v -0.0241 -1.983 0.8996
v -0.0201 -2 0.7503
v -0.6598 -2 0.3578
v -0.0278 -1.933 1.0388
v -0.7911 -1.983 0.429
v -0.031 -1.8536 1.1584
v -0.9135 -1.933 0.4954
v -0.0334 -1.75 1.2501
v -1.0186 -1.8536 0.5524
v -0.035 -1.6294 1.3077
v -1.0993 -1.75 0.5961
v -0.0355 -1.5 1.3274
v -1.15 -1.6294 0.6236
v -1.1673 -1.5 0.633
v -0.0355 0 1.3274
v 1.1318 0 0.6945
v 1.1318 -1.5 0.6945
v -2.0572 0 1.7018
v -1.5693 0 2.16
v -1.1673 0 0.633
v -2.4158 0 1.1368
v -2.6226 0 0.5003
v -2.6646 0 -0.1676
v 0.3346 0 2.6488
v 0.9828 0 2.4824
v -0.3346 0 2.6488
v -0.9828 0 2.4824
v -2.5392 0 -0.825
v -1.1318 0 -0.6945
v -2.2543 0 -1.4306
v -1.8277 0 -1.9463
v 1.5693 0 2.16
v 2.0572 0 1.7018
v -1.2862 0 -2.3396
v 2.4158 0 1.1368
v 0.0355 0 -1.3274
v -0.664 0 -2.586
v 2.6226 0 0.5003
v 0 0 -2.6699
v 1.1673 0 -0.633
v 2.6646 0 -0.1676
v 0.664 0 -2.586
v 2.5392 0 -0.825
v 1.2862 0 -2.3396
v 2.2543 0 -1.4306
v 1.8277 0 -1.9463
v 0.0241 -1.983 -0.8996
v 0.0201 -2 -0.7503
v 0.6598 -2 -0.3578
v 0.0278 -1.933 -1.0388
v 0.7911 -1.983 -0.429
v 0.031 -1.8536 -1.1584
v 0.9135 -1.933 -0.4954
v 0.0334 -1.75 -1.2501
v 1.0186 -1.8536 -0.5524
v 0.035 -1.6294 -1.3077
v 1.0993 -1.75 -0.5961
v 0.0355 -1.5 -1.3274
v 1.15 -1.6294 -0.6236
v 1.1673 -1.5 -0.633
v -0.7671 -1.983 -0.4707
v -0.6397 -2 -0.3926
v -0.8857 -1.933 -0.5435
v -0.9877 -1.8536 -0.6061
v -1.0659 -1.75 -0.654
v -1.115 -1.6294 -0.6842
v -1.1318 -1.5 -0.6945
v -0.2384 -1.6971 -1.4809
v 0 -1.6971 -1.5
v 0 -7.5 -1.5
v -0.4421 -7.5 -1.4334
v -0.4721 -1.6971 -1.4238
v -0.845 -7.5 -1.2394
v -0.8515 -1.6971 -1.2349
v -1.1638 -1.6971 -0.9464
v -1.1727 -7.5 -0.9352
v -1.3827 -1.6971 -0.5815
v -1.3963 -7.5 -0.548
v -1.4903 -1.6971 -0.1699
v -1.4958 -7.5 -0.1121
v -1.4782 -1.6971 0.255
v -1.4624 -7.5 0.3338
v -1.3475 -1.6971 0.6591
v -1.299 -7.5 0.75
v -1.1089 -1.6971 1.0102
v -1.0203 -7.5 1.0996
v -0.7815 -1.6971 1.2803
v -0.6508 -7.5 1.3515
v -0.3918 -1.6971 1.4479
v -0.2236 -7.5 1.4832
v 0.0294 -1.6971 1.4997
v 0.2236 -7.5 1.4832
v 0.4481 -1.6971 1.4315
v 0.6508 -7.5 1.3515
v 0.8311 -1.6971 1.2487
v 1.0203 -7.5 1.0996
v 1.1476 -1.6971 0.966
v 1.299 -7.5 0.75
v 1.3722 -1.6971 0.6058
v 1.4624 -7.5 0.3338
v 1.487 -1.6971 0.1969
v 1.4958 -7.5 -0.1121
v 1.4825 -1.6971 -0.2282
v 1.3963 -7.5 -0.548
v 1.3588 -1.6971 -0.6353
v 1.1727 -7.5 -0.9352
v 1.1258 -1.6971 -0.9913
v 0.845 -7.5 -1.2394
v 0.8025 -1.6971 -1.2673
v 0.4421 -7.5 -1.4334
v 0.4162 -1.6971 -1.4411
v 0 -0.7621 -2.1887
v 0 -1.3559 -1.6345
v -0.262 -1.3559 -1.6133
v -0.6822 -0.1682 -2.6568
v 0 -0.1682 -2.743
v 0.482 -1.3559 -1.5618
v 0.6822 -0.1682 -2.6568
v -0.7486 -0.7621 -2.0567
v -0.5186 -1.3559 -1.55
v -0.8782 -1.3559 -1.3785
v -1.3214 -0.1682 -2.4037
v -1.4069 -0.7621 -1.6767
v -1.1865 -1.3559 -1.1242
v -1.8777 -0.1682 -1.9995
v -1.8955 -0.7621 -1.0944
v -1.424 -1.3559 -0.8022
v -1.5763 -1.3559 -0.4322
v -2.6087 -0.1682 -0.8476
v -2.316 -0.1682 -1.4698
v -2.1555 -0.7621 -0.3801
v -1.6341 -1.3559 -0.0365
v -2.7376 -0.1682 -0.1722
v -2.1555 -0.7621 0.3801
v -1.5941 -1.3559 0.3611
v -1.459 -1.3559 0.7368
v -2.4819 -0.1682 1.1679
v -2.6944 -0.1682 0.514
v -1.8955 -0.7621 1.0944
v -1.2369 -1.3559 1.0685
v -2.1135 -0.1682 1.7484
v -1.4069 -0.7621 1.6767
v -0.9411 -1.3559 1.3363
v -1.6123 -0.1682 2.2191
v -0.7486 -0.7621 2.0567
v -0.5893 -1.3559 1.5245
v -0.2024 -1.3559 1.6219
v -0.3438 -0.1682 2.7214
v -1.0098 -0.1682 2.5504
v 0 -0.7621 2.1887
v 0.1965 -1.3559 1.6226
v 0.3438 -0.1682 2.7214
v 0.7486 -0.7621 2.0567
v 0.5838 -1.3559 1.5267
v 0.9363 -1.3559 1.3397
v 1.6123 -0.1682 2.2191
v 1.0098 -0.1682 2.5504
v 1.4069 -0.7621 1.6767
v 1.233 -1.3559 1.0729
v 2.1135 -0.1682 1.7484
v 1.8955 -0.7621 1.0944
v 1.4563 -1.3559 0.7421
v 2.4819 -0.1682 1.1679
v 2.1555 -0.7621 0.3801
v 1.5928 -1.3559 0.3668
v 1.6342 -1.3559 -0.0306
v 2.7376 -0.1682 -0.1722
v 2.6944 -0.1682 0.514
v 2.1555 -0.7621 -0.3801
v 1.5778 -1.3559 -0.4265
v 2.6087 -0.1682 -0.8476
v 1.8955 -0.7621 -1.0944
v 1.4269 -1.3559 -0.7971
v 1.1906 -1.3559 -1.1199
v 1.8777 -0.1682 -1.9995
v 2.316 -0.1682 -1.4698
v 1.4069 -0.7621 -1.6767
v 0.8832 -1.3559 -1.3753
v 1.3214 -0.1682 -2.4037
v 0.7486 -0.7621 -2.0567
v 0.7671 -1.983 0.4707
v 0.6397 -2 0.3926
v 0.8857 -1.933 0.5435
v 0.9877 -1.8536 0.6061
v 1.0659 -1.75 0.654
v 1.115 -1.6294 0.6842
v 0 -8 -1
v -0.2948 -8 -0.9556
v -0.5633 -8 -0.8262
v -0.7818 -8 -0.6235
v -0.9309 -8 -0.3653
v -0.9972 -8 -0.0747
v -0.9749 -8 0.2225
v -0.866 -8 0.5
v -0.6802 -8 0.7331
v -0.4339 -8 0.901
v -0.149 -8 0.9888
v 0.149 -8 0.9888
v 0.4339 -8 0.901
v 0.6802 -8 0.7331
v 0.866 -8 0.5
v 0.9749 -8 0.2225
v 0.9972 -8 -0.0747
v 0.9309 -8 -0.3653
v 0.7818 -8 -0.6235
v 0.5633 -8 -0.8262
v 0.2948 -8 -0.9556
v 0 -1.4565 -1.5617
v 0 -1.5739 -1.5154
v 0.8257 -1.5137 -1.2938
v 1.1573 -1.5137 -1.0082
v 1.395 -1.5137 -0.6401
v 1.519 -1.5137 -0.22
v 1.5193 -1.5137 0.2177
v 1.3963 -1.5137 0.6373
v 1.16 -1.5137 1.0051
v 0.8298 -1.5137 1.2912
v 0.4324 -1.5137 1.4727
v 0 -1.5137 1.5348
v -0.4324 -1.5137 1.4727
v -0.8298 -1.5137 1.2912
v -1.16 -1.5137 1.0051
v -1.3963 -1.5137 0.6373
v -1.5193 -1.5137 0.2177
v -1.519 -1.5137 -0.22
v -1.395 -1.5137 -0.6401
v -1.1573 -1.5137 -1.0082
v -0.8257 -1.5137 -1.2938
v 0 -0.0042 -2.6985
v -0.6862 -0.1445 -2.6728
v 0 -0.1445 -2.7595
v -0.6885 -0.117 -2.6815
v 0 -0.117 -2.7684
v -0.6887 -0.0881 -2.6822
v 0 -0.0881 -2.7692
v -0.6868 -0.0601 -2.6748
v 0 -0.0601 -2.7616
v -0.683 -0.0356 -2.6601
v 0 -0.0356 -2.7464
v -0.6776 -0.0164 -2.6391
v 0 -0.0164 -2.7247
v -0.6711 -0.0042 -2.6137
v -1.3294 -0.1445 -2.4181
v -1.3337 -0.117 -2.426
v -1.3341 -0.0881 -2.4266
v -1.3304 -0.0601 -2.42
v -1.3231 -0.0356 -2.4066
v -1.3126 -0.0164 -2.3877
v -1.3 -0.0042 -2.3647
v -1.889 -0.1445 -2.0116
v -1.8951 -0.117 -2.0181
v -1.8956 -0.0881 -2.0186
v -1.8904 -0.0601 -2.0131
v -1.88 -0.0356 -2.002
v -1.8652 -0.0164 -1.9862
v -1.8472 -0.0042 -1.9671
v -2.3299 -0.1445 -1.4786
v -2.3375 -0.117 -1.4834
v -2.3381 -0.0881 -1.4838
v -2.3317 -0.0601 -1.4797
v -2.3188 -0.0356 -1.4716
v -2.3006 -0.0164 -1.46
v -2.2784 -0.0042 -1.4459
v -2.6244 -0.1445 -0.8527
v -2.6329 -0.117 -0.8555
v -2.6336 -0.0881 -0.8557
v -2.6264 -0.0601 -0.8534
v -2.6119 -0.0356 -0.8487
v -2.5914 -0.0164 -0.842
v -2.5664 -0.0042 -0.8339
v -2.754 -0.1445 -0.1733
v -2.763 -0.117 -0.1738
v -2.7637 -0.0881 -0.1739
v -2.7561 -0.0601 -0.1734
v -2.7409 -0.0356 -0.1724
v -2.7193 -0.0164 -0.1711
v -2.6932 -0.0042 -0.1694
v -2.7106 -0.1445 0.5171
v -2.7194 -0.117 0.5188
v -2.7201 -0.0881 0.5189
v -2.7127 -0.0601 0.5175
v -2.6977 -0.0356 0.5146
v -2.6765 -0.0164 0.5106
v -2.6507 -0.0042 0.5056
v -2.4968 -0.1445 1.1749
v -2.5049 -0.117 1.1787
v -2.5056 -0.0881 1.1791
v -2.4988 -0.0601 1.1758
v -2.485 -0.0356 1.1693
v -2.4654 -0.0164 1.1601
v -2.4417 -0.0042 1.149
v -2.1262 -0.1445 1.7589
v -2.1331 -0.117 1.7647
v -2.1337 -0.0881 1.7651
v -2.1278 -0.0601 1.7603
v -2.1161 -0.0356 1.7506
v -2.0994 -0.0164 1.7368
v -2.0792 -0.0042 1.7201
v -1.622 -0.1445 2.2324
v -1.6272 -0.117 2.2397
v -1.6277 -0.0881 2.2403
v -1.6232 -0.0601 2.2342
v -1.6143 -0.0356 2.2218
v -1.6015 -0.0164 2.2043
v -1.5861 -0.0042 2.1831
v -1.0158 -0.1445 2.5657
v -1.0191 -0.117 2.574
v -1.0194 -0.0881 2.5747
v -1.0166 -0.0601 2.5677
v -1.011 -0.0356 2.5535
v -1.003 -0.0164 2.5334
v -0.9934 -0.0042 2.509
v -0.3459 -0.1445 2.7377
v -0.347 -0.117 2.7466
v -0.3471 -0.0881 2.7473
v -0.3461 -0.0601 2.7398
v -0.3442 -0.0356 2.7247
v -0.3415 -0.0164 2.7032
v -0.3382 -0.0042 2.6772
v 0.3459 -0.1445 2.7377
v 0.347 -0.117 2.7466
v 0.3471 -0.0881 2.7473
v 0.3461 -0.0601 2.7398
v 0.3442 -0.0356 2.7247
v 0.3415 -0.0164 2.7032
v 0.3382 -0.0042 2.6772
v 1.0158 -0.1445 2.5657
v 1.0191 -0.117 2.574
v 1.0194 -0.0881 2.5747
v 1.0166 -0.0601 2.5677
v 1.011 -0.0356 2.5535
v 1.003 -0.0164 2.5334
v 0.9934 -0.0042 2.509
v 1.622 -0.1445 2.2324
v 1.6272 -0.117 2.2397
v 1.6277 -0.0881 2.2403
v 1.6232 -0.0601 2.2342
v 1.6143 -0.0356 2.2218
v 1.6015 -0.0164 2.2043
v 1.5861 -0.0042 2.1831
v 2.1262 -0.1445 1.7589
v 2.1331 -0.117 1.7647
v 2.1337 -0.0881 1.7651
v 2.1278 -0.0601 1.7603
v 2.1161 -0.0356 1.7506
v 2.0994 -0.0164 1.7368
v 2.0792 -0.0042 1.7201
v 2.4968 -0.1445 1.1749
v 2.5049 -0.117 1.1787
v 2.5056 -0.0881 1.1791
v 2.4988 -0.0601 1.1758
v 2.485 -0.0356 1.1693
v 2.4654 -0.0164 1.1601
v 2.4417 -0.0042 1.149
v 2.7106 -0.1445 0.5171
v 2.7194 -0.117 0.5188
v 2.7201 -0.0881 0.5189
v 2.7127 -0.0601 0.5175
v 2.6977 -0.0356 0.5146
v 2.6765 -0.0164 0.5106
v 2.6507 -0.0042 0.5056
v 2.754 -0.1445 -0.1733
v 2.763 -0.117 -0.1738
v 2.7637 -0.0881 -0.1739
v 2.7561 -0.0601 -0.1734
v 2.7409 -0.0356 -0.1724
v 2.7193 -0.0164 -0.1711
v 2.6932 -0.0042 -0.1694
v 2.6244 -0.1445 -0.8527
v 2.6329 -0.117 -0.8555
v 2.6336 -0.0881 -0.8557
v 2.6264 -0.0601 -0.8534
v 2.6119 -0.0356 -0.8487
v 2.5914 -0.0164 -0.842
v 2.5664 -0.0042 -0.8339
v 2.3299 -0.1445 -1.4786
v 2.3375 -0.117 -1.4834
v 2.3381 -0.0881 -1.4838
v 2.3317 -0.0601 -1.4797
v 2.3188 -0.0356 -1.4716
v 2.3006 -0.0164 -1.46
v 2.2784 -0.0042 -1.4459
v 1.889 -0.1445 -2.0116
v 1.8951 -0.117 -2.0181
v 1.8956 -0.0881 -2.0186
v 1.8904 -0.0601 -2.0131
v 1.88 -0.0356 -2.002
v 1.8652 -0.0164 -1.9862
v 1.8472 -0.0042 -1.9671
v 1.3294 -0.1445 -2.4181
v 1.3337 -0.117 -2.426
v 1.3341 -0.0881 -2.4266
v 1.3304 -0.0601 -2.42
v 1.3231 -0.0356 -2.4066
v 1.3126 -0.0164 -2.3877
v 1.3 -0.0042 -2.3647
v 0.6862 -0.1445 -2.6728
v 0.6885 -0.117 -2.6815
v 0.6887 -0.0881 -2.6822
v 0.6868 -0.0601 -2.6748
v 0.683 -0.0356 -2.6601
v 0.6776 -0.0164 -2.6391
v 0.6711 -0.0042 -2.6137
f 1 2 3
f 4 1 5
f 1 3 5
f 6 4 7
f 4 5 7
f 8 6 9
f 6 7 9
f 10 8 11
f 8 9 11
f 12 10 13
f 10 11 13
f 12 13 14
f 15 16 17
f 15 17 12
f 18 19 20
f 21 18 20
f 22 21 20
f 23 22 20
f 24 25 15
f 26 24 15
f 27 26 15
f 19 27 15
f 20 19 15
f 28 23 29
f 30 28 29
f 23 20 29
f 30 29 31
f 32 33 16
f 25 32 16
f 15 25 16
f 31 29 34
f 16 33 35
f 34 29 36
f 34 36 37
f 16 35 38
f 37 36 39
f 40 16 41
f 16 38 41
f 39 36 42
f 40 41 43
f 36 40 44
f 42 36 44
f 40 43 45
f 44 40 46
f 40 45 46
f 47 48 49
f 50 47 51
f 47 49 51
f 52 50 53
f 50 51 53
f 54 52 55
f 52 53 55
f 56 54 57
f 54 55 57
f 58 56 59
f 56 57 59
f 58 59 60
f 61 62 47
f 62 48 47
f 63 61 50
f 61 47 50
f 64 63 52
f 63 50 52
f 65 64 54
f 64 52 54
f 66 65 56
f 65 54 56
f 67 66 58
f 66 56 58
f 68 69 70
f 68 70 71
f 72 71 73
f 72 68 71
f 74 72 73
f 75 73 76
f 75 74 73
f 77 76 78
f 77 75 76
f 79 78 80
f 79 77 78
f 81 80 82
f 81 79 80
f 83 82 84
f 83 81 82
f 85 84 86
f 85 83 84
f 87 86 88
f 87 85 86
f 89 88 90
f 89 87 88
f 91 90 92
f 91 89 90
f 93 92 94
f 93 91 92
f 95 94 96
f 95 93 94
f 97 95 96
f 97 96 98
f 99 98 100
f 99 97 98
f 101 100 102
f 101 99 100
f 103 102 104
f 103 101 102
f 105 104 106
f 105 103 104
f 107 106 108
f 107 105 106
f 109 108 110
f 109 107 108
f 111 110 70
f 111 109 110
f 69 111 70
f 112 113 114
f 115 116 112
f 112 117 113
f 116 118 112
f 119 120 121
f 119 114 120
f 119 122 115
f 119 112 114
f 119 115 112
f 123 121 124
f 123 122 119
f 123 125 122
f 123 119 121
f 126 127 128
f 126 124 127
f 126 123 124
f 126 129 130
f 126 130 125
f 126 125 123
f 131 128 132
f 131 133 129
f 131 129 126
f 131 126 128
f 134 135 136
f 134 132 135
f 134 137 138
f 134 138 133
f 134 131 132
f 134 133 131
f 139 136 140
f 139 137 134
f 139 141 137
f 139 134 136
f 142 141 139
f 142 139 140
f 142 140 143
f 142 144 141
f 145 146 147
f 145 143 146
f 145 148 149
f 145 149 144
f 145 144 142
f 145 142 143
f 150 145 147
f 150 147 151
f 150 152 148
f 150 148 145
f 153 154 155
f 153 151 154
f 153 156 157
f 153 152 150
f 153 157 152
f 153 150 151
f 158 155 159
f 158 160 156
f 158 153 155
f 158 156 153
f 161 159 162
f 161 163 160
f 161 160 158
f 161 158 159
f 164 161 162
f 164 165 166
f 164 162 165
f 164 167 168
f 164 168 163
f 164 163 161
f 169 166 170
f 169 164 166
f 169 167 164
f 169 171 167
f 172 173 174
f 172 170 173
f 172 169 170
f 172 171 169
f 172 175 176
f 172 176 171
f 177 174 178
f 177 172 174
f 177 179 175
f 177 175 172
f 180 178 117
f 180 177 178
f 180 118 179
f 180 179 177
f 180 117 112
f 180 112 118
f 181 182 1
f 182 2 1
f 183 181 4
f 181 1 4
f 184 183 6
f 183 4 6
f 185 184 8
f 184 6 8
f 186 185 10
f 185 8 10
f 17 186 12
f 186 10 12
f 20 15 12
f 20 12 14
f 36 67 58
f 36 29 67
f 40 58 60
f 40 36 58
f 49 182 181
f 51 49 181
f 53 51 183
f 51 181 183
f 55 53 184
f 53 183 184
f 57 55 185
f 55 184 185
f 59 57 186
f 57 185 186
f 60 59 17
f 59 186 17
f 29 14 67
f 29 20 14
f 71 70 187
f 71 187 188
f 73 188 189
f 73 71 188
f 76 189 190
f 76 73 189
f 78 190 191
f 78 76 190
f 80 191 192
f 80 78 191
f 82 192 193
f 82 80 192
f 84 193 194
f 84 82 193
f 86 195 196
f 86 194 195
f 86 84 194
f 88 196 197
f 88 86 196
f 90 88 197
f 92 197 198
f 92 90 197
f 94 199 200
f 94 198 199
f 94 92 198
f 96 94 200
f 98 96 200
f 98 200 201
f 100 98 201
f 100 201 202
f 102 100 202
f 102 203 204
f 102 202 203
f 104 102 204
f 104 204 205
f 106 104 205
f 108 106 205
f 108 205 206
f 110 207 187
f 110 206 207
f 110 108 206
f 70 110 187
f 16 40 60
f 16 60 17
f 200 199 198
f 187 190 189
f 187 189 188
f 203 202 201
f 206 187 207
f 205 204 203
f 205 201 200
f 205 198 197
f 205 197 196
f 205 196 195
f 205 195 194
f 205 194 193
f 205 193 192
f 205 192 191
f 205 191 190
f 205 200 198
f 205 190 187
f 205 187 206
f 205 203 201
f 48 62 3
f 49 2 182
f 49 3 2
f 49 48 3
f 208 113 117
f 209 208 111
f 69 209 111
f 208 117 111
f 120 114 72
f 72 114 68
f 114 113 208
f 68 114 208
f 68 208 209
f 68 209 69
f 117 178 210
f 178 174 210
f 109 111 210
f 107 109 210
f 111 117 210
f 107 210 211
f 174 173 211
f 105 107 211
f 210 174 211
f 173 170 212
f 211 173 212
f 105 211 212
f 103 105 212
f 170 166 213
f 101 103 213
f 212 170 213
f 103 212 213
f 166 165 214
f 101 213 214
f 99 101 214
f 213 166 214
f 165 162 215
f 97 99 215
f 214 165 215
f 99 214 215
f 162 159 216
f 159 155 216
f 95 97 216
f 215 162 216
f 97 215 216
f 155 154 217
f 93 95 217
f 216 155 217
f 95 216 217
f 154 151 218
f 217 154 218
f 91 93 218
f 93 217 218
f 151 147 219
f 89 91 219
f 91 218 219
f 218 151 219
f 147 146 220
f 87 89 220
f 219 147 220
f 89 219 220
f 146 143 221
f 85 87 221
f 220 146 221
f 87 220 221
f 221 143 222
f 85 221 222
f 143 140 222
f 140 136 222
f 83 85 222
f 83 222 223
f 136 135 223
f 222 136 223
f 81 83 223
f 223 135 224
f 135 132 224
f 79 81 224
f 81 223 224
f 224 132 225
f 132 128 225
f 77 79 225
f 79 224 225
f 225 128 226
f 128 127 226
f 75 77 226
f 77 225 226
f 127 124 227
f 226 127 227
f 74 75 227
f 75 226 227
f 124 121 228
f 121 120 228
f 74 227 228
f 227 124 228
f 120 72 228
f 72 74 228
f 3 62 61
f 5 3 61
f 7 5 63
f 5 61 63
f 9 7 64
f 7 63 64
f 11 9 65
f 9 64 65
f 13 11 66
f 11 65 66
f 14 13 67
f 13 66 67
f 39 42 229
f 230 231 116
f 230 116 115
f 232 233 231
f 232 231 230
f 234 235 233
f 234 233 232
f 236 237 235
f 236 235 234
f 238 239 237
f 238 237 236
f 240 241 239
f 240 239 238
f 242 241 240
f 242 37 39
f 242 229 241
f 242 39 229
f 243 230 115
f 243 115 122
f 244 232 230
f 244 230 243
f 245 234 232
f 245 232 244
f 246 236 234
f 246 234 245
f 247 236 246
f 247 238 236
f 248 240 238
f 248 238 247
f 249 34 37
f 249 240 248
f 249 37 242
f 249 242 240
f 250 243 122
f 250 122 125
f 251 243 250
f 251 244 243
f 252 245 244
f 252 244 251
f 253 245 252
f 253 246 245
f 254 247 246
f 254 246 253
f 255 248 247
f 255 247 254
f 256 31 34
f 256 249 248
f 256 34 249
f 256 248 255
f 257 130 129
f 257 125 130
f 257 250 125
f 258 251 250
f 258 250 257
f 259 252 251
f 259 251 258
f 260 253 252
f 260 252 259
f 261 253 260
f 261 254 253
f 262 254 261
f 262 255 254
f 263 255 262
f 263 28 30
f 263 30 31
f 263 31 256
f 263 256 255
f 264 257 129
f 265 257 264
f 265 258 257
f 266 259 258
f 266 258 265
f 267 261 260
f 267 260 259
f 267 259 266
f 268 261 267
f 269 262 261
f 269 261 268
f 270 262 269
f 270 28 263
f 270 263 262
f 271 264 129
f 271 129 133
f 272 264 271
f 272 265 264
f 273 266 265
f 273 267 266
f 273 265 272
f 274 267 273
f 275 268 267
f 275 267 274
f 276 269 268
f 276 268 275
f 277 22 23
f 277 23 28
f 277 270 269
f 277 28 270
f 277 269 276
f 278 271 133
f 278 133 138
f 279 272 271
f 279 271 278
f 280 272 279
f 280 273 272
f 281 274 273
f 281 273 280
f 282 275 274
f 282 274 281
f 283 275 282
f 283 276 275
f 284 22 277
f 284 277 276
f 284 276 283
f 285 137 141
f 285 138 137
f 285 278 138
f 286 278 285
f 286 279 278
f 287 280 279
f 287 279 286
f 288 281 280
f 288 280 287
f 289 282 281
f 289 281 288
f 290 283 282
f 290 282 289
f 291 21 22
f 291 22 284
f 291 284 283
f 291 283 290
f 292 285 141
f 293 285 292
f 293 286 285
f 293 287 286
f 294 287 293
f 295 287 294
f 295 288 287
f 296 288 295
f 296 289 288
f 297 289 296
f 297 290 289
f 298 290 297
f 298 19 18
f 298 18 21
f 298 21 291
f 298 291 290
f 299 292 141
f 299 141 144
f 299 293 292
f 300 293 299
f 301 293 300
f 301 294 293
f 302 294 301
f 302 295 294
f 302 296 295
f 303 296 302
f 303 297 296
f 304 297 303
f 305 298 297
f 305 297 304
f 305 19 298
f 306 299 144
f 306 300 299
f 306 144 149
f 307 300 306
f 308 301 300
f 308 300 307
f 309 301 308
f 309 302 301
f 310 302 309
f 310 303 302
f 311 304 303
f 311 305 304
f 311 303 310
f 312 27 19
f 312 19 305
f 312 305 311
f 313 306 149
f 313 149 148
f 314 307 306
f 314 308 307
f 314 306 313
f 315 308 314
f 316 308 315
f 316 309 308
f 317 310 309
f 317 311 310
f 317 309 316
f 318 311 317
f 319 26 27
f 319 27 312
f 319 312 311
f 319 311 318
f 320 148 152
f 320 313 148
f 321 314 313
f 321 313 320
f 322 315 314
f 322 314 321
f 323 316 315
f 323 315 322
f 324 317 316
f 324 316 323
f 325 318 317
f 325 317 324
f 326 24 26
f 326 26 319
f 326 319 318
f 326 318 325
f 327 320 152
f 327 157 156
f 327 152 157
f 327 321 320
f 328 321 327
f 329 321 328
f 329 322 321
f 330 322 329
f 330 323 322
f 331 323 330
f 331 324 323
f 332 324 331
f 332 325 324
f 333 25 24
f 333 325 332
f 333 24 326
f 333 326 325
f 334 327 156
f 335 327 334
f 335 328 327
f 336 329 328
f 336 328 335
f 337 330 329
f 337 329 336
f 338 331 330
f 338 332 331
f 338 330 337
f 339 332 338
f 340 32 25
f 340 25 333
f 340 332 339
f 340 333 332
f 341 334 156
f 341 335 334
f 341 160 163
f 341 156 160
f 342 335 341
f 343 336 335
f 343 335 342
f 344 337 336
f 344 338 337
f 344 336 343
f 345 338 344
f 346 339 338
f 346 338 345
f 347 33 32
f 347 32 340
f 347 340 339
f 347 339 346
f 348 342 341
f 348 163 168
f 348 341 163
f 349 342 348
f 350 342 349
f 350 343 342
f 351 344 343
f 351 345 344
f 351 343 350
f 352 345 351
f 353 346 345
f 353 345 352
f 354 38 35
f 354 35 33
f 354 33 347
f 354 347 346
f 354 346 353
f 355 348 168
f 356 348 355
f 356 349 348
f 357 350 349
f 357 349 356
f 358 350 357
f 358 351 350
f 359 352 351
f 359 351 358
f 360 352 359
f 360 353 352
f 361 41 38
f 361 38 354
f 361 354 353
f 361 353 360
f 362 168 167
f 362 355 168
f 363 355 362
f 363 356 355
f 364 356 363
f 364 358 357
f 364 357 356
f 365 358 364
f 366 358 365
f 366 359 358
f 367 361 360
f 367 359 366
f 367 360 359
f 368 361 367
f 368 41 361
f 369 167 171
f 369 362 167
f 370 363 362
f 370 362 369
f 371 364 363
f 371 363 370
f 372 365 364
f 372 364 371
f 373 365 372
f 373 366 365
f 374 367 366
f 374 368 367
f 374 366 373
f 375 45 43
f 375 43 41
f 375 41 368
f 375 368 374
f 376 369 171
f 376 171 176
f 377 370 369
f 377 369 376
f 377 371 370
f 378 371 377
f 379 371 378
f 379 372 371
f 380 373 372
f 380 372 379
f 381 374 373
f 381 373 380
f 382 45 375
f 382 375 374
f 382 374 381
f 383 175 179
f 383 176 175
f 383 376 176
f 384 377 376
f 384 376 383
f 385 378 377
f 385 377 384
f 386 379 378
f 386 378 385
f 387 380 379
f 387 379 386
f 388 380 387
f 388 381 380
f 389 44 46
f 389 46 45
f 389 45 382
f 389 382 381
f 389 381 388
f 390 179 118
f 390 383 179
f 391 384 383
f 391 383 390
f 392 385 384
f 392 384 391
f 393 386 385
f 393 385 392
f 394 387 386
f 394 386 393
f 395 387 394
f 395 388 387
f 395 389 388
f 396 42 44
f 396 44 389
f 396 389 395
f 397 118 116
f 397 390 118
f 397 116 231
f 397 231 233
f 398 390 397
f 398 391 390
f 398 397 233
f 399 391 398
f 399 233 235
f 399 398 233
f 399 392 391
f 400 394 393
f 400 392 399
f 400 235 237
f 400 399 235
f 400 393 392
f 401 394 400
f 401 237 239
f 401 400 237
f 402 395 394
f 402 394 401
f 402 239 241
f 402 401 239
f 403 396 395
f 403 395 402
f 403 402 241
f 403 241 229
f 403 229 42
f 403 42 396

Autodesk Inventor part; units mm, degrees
ref_plane "YZ Plane" through (0, 0, 0) normal (1, 0, 0) x (0, 1, 0)
ref_plane "XZ Plane" through (0, 0, 0) normal (0, 1, 0) x (-1, 0, 0)
ref_plane "XY Plane" through (0, 0, 0) normal (0, 0, 1) x (1, 0, 0)
sketch "Szkic2" plane through (0, 0, 0) normal (1, 0, 0) x (0, 1, 0)
  line L0 (0, -2.9) -> (0, 2.9)
  line L1 (-1.5, -1.5) -> (-1.5, 1.5)
  line L2 (-1.5, -1.5) -> (0, -2.9)
  line L3 (-1.5, 1.5) -> (0, 2.9)
  line L4 (0, 0) -> (-8, 0)
  line L5 (-8, 0) -> (-8, -1.5)
  line L6 (-8, -1.5) -> (-1.5, -1.5)
  dimension "d0" = 5.8
  dimension "d2" = 3
  dimension "d3" = 1.5
  dimension "d4" = 8
  dimension "d5" = 1.5
revolve "Obrót1" add sketch "Szkic2" angle 360 about axis through (0, 0, 0) along (0, -1, 0) contours L2 L1 L4 L0 | L6 L5 L4 L1
sketch "Szkic3" plane through (0, 0, 0) normal (0, 1, 0) x (1, 0, 0)
  line L0 (-1.1673, -0.633) -> (-1.1318, 0.6945)
  line L1 (-1.1318, 0.6945) -> (0.0355, 1.3274)
  line L2 (0.0355, 1.3274) -> (1.1673, 0.633)
  line L3 (1.1673, 0.633) -> (1.1318, -0.6945)
  line L4 (1.1318, -0.6945) -> (-0.0355, -1.3274)
  line L5 (-0.0355, -1.3274) -> (-1.1673, -0.633)
  point P0 (0, 0)
  point P1 (0, 0)
  dimension "d7" = 2.3
extrude "Wyciągnięcie proste1" cut sketch "Szkic3" against normal blind 2
fillet "Zaokrąglenie1" radius 0.5 6 edges at (-1.1496, -2, -0.0308) (-0.6014, -2, 0.9802) (-0.5482, -2, -1.011) (0.6014, -2, -0.9802) (0.5482, -2, 1.011) (1.1496, -2, 0.0308)
fillet "Zaokrąglenie2" radius 0.5 1 edges at (0, -1.5, 1.5)
fillet "Zaokrąglenie3" radius 0.1 1 edges at (0, 0, 2.9)
thread "Gwint1" size "M3x0.5" class "6g" standard "ANSI Metric M Profile" full length
chamfer "Faza1" distance 0.5 angle 45 1 edges at (0, -8, 1.5)
properties part number "Screw M3 8mm flat head"
